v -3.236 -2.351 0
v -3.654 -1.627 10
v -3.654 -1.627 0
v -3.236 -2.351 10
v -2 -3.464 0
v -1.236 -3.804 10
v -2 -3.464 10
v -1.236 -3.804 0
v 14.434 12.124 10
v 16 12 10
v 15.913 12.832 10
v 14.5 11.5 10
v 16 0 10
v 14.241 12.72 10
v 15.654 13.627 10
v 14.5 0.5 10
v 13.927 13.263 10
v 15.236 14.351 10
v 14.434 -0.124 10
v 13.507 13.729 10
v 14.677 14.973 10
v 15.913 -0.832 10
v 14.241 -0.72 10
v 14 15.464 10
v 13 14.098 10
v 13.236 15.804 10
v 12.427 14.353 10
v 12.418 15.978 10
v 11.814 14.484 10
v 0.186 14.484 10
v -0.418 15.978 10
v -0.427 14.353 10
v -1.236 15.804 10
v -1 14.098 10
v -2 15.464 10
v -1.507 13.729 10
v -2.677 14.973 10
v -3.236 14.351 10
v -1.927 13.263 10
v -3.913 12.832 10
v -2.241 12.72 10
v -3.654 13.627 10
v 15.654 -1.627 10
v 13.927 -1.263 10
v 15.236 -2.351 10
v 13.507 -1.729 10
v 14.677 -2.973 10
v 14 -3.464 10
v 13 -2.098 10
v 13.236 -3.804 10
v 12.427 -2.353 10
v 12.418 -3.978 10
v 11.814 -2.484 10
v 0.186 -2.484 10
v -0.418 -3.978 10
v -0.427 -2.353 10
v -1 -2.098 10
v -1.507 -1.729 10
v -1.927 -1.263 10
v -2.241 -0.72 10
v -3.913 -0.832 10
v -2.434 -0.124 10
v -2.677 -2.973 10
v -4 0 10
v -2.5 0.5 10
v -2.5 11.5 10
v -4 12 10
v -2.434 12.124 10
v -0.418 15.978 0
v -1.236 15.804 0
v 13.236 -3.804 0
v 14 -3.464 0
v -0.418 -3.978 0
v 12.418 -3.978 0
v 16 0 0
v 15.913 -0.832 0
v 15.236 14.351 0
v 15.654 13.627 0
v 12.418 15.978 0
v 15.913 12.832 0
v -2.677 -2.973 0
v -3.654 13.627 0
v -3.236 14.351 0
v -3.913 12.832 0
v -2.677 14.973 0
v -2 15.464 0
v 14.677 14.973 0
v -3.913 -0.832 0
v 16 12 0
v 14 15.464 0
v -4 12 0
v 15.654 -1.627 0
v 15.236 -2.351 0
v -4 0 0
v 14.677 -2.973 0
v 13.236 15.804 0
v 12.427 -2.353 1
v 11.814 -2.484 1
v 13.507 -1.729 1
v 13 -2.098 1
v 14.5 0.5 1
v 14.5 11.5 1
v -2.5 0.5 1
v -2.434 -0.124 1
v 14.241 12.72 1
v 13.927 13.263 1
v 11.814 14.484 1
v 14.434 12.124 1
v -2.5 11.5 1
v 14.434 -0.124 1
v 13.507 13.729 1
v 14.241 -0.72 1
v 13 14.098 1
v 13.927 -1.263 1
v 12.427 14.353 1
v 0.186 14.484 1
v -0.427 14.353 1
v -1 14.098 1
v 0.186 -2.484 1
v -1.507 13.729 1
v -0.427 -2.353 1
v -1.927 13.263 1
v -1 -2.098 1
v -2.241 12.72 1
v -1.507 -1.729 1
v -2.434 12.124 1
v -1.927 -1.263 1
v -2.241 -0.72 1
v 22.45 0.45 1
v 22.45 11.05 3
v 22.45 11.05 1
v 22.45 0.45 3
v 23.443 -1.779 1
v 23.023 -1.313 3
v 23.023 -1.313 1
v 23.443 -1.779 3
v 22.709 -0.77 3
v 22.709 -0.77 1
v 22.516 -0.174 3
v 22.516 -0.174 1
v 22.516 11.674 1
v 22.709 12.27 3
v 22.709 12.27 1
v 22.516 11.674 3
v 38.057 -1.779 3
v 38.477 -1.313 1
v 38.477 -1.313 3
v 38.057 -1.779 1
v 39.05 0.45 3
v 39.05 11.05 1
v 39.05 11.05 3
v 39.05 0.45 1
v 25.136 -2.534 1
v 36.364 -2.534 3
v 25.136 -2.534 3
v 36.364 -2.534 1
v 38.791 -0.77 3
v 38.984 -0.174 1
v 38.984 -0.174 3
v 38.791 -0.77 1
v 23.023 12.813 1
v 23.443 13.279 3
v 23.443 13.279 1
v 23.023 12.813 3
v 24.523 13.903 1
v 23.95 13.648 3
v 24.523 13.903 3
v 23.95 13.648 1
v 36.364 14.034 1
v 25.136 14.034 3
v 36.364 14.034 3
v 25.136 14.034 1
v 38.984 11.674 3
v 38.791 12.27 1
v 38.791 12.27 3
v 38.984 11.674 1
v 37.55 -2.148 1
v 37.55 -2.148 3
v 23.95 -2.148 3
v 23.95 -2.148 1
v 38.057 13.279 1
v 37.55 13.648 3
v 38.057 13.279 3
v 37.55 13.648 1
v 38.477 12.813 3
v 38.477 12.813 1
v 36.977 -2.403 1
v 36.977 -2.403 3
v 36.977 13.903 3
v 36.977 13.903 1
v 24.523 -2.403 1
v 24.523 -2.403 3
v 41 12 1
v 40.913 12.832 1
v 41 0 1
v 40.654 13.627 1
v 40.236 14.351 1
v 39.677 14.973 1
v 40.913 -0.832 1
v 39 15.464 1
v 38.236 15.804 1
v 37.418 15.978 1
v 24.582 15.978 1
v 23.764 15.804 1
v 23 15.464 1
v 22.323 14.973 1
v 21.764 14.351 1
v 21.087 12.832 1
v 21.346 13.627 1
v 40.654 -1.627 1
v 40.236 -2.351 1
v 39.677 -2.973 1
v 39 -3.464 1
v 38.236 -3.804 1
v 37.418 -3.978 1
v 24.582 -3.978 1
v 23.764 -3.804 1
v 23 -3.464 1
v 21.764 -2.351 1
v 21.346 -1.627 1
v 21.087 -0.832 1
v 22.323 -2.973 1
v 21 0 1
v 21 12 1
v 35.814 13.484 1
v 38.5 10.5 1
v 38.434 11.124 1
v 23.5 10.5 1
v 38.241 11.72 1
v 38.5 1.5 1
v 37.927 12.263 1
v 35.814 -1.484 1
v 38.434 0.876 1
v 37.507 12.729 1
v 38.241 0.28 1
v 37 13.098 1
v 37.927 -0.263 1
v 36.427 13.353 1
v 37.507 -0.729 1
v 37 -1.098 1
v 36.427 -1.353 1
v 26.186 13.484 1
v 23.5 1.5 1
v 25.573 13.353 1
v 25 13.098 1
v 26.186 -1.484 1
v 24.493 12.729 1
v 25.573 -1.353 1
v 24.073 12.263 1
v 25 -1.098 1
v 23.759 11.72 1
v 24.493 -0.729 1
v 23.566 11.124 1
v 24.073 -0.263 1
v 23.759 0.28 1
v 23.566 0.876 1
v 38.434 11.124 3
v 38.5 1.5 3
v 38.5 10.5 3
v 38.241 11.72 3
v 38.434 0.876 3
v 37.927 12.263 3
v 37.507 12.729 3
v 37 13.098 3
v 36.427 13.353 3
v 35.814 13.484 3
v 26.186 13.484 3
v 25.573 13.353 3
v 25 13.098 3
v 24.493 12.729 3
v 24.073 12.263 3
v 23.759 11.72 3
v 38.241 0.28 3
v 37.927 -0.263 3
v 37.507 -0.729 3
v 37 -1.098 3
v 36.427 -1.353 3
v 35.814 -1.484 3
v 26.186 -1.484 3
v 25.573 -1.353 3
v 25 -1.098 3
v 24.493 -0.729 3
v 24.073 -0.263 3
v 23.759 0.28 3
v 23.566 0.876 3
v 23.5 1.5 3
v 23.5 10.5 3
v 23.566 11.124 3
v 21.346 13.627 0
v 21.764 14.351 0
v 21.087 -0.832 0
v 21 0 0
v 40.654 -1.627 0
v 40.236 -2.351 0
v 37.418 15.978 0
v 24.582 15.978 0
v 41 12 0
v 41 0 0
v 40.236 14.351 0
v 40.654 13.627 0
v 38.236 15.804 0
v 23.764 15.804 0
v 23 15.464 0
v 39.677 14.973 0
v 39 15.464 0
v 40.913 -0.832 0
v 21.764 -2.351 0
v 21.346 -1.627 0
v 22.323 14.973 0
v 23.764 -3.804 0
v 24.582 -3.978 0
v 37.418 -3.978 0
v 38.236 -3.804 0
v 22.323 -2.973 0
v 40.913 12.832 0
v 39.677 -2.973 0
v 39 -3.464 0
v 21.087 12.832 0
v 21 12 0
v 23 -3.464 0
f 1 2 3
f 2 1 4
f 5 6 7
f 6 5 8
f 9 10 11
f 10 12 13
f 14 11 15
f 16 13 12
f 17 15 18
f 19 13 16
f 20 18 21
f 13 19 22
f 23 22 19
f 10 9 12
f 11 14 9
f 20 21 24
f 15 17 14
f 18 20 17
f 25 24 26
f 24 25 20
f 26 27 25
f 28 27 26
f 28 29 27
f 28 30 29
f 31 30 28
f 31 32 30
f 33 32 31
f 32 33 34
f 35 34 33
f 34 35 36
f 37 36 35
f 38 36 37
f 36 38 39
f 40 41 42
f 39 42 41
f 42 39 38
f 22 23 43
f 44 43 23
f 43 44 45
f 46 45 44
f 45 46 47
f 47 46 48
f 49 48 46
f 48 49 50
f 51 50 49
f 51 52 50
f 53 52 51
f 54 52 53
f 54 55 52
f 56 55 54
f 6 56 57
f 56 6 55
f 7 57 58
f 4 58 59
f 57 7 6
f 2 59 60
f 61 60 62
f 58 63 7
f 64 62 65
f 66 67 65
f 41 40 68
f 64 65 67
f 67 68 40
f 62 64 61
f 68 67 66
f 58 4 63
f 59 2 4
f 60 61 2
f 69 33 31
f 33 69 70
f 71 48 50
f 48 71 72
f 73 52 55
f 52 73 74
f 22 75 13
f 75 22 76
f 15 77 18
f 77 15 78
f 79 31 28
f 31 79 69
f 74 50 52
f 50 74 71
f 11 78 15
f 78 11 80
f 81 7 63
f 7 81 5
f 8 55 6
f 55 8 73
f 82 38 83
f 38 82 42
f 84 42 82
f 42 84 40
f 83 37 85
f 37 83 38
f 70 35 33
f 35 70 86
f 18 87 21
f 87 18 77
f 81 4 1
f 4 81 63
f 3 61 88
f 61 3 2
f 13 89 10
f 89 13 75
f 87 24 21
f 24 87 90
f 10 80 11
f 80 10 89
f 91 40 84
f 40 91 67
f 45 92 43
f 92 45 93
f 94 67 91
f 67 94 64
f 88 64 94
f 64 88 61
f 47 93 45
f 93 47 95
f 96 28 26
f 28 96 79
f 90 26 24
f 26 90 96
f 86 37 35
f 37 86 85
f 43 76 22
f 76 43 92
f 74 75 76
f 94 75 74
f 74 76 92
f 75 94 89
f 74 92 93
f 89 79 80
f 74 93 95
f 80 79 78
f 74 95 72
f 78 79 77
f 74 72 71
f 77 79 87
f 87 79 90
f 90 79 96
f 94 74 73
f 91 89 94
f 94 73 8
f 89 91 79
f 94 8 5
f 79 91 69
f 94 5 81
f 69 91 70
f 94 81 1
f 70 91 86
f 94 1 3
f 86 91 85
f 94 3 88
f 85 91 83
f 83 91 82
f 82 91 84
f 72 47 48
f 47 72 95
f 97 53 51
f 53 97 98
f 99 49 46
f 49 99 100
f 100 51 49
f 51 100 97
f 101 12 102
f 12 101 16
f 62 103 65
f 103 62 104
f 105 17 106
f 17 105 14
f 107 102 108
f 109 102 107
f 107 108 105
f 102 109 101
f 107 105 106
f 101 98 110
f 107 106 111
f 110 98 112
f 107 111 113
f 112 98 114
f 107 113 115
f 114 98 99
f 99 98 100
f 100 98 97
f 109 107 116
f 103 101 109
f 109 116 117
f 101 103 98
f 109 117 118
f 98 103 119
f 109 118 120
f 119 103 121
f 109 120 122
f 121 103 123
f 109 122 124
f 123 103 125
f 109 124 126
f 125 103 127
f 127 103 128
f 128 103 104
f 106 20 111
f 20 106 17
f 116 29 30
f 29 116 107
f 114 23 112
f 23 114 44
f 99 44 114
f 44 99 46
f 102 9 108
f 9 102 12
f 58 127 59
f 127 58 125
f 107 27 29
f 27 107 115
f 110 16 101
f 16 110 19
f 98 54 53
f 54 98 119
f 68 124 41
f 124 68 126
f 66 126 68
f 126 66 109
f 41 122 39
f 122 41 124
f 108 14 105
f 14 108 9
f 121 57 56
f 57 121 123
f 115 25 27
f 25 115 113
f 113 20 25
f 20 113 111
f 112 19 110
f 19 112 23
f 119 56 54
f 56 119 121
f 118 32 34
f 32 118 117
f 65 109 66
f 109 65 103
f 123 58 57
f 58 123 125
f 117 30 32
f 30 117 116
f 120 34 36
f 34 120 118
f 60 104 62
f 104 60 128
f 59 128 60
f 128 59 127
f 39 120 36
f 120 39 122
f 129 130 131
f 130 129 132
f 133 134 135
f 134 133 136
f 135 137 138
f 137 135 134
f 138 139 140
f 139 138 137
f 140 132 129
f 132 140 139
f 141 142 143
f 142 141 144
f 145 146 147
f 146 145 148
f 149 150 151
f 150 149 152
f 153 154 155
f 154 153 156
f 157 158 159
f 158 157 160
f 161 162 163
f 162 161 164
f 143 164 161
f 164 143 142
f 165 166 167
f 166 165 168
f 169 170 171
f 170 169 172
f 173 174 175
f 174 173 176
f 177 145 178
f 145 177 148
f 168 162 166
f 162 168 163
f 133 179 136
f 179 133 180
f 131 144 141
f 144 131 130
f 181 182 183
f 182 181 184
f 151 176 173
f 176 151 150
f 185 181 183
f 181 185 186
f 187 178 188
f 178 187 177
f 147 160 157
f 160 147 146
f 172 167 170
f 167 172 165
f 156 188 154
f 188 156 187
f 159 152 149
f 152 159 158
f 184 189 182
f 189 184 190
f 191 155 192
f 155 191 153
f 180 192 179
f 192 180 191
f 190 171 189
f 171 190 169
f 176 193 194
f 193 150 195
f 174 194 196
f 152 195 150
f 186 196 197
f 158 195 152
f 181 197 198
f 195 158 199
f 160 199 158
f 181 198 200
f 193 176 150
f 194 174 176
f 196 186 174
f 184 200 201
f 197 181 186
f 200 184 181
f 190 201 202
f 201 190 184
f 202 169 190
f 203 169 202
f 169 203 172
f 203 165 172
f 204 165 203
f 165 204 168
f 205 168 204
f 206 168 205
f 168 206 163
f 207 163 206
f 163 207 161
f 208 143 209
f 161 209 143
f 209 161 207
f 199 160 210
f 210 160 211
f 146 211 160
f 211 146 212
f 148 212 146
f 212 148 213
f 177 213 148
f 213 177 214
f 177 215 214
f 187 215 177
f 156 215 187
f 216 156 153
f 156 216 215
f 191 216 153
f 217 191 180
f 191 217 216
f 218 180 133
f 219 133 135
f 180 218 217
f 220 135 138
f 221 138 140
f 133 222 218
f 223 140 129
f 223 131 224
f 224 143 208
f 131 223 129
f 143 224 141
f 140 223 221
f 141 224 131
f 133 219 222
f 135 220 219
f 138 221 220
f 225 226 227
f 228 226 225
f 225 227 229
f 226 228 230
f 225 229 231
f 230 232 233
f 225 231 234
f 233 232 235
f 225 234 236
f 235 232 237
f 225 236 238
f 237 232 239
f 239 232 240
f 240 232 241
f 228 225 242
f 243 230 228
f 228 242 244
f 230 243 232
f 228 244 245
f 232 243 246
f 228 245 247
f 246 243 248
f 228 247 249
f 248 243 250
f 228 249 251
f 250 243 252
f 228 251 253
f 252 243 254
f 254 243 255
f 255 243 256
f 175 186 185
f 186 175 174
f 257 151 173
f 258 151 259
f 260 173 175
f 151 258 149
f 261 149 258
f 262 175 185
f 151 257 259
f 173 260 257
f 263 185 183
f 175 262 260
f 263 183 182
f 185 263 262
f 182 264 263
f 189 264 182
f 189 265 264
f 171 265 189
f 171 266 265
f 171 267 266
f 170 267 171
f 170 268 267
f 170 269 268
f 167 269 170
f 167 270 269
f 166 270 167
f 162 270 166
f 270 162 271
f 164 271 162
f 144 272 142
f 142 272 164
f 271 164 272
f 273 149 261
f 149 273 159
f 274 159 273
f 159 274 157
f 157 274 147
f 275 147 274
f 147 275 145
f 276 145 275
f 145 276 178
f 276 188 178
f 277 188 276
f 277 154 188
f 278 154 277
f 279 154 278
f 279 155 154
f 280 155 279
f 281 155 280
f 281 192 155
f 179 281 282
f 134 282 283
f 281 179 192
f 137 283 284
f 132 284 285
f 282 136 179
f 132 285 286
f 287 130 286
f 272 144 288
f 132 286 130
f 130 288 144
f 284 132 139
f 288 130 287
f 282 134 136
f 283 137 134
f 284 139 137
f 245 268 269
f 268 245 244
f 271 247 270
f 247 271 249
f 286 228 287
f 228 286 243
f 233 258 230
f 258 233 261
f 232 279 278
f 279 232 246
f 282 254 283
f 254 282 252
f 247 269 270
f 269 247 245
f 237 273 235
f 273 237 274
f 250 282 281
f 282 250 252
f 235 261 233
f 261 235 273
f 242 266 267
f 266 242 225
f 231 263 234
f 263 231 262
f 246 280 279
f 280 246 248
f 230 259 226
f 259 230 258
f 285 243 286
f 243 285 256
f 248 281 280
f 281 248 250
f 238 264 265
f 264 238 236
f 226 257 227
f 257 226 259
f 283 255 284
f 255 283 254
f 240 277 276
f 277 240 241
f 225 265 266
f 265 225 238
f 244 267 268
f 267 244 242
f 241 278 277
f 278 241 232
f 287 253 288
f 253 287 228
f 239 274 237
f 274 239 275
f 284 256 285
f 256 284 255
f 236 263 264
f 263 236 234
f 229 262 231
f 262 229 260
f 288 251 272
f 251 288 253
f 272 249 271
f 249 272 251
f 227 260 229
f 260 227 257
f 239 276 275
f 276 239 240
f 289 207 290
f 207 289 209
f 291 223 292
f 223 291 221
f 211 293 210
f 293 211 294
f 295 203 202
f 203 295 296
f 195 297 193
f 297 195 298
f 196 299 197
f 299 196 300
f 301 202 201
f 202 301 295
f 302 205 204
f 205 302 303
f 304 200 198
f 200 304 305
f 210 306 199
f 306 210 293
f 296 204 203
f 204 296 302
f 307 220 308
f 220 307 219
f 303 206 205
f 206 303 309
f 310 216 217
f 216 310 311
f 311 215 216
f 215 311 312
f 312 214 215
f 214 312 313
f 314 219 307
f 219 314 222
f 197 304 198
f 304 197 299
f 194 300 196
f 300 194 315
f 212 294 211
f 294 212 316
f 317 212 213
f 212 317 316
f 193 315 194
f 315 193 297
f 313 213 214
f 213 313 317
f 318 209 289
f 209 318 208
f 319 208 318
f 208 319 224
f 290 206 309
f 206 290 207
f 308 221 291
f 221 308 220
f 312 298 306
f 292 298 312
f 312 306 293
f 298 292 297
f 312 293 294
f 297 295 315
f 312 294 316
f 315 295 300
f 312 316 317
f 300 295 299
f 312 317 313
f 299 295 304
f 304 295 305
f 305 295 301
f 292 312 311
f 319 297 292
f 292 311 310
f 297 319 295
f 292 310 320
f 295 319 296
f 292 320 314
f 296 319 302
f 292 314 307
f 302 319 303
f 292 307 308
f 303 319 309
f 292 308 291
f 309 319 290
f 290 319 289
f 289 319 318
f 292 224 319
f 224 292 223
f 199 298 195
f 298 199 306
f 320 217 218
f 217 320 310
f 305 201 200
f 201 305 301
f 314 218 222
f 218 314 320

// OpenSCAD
// Another Customizable Rounded Corner box
// Hari Wiguna, Dec 2013

// Box Outer dimensions (in mmm)
Width = 20;
Depth = 20;
Height = 10;
Radius = 4;
WallThickness = 1;

// Lip at bottom of the lid that fits into the box
LipHeight = 2;

// Clearance between the lid lip and the box inside. Smaller = Tighter fit
Clearance = 0.2;

// Curve resolution (higher=smoother)
$fn=30;
Width2 = Width - WallThickness;
Depth2 = Depth - WallThickness;
Radius2 = Radius - WallThickness;
Height2 = Height - WallThickness;

Width3 = Width2 - 2*WallThickness;
Depth3 = Depth2 - 2*WallThickness;

Box();
translate([Width+5,0,0]) LidWithLip();

module LidWithLip()
{
	union()
	{
		Lid();
		LidLip();
	}
}

module Lid()
{
	minkowski()
	{
		cube([Width-2*Radius,Depth-2*Radius,WallThickness/2]);
		cylinder(WallThickness/2,Radius,Radius);
	}
}

module LidLip()
{
	difference()
	{
		translate([WallThickness/4+Clearance,WallThickness/4+Clearance,WallThickness])
		minkowski()
		{
			cube([Width2-2*Radius-2*Clearance, Depth2-2*Radius-2*Clearance, LipHeight/2]);
			cylinder(LipHeight/2, Radius2, Radius2);
		}

		translate([WallThickness*1.5,WallThickness*1.5,WallThickness])
		minkowski()
		{
			cube([Width3-2*Radius, Depth3-2*Radius, LipHeight/2]);
			cylinder(LipHeight/2, Radius2, Radius2);
		}
	}
}

module Box()
{
	difference()
	{
		OuterShell();
		InnerShell();
	}
}

module OuterShell()
{
	minkowski()
	{
		cube([Width-2*Radius,Depth-2*Radius,Height/2]);
		cylinder(Height/2,Radius,Radius);
	}
}


module InnerShell()
{
	translate([WallThickness/2,WallThickness/2,WallThickness])
	minkowski()
	{
		cube([Width2-(2*Radius), Depth2-(2*Radius), Height/2]);
		cylinder(Height2/2, Radius2, Radius2);
	}
}
